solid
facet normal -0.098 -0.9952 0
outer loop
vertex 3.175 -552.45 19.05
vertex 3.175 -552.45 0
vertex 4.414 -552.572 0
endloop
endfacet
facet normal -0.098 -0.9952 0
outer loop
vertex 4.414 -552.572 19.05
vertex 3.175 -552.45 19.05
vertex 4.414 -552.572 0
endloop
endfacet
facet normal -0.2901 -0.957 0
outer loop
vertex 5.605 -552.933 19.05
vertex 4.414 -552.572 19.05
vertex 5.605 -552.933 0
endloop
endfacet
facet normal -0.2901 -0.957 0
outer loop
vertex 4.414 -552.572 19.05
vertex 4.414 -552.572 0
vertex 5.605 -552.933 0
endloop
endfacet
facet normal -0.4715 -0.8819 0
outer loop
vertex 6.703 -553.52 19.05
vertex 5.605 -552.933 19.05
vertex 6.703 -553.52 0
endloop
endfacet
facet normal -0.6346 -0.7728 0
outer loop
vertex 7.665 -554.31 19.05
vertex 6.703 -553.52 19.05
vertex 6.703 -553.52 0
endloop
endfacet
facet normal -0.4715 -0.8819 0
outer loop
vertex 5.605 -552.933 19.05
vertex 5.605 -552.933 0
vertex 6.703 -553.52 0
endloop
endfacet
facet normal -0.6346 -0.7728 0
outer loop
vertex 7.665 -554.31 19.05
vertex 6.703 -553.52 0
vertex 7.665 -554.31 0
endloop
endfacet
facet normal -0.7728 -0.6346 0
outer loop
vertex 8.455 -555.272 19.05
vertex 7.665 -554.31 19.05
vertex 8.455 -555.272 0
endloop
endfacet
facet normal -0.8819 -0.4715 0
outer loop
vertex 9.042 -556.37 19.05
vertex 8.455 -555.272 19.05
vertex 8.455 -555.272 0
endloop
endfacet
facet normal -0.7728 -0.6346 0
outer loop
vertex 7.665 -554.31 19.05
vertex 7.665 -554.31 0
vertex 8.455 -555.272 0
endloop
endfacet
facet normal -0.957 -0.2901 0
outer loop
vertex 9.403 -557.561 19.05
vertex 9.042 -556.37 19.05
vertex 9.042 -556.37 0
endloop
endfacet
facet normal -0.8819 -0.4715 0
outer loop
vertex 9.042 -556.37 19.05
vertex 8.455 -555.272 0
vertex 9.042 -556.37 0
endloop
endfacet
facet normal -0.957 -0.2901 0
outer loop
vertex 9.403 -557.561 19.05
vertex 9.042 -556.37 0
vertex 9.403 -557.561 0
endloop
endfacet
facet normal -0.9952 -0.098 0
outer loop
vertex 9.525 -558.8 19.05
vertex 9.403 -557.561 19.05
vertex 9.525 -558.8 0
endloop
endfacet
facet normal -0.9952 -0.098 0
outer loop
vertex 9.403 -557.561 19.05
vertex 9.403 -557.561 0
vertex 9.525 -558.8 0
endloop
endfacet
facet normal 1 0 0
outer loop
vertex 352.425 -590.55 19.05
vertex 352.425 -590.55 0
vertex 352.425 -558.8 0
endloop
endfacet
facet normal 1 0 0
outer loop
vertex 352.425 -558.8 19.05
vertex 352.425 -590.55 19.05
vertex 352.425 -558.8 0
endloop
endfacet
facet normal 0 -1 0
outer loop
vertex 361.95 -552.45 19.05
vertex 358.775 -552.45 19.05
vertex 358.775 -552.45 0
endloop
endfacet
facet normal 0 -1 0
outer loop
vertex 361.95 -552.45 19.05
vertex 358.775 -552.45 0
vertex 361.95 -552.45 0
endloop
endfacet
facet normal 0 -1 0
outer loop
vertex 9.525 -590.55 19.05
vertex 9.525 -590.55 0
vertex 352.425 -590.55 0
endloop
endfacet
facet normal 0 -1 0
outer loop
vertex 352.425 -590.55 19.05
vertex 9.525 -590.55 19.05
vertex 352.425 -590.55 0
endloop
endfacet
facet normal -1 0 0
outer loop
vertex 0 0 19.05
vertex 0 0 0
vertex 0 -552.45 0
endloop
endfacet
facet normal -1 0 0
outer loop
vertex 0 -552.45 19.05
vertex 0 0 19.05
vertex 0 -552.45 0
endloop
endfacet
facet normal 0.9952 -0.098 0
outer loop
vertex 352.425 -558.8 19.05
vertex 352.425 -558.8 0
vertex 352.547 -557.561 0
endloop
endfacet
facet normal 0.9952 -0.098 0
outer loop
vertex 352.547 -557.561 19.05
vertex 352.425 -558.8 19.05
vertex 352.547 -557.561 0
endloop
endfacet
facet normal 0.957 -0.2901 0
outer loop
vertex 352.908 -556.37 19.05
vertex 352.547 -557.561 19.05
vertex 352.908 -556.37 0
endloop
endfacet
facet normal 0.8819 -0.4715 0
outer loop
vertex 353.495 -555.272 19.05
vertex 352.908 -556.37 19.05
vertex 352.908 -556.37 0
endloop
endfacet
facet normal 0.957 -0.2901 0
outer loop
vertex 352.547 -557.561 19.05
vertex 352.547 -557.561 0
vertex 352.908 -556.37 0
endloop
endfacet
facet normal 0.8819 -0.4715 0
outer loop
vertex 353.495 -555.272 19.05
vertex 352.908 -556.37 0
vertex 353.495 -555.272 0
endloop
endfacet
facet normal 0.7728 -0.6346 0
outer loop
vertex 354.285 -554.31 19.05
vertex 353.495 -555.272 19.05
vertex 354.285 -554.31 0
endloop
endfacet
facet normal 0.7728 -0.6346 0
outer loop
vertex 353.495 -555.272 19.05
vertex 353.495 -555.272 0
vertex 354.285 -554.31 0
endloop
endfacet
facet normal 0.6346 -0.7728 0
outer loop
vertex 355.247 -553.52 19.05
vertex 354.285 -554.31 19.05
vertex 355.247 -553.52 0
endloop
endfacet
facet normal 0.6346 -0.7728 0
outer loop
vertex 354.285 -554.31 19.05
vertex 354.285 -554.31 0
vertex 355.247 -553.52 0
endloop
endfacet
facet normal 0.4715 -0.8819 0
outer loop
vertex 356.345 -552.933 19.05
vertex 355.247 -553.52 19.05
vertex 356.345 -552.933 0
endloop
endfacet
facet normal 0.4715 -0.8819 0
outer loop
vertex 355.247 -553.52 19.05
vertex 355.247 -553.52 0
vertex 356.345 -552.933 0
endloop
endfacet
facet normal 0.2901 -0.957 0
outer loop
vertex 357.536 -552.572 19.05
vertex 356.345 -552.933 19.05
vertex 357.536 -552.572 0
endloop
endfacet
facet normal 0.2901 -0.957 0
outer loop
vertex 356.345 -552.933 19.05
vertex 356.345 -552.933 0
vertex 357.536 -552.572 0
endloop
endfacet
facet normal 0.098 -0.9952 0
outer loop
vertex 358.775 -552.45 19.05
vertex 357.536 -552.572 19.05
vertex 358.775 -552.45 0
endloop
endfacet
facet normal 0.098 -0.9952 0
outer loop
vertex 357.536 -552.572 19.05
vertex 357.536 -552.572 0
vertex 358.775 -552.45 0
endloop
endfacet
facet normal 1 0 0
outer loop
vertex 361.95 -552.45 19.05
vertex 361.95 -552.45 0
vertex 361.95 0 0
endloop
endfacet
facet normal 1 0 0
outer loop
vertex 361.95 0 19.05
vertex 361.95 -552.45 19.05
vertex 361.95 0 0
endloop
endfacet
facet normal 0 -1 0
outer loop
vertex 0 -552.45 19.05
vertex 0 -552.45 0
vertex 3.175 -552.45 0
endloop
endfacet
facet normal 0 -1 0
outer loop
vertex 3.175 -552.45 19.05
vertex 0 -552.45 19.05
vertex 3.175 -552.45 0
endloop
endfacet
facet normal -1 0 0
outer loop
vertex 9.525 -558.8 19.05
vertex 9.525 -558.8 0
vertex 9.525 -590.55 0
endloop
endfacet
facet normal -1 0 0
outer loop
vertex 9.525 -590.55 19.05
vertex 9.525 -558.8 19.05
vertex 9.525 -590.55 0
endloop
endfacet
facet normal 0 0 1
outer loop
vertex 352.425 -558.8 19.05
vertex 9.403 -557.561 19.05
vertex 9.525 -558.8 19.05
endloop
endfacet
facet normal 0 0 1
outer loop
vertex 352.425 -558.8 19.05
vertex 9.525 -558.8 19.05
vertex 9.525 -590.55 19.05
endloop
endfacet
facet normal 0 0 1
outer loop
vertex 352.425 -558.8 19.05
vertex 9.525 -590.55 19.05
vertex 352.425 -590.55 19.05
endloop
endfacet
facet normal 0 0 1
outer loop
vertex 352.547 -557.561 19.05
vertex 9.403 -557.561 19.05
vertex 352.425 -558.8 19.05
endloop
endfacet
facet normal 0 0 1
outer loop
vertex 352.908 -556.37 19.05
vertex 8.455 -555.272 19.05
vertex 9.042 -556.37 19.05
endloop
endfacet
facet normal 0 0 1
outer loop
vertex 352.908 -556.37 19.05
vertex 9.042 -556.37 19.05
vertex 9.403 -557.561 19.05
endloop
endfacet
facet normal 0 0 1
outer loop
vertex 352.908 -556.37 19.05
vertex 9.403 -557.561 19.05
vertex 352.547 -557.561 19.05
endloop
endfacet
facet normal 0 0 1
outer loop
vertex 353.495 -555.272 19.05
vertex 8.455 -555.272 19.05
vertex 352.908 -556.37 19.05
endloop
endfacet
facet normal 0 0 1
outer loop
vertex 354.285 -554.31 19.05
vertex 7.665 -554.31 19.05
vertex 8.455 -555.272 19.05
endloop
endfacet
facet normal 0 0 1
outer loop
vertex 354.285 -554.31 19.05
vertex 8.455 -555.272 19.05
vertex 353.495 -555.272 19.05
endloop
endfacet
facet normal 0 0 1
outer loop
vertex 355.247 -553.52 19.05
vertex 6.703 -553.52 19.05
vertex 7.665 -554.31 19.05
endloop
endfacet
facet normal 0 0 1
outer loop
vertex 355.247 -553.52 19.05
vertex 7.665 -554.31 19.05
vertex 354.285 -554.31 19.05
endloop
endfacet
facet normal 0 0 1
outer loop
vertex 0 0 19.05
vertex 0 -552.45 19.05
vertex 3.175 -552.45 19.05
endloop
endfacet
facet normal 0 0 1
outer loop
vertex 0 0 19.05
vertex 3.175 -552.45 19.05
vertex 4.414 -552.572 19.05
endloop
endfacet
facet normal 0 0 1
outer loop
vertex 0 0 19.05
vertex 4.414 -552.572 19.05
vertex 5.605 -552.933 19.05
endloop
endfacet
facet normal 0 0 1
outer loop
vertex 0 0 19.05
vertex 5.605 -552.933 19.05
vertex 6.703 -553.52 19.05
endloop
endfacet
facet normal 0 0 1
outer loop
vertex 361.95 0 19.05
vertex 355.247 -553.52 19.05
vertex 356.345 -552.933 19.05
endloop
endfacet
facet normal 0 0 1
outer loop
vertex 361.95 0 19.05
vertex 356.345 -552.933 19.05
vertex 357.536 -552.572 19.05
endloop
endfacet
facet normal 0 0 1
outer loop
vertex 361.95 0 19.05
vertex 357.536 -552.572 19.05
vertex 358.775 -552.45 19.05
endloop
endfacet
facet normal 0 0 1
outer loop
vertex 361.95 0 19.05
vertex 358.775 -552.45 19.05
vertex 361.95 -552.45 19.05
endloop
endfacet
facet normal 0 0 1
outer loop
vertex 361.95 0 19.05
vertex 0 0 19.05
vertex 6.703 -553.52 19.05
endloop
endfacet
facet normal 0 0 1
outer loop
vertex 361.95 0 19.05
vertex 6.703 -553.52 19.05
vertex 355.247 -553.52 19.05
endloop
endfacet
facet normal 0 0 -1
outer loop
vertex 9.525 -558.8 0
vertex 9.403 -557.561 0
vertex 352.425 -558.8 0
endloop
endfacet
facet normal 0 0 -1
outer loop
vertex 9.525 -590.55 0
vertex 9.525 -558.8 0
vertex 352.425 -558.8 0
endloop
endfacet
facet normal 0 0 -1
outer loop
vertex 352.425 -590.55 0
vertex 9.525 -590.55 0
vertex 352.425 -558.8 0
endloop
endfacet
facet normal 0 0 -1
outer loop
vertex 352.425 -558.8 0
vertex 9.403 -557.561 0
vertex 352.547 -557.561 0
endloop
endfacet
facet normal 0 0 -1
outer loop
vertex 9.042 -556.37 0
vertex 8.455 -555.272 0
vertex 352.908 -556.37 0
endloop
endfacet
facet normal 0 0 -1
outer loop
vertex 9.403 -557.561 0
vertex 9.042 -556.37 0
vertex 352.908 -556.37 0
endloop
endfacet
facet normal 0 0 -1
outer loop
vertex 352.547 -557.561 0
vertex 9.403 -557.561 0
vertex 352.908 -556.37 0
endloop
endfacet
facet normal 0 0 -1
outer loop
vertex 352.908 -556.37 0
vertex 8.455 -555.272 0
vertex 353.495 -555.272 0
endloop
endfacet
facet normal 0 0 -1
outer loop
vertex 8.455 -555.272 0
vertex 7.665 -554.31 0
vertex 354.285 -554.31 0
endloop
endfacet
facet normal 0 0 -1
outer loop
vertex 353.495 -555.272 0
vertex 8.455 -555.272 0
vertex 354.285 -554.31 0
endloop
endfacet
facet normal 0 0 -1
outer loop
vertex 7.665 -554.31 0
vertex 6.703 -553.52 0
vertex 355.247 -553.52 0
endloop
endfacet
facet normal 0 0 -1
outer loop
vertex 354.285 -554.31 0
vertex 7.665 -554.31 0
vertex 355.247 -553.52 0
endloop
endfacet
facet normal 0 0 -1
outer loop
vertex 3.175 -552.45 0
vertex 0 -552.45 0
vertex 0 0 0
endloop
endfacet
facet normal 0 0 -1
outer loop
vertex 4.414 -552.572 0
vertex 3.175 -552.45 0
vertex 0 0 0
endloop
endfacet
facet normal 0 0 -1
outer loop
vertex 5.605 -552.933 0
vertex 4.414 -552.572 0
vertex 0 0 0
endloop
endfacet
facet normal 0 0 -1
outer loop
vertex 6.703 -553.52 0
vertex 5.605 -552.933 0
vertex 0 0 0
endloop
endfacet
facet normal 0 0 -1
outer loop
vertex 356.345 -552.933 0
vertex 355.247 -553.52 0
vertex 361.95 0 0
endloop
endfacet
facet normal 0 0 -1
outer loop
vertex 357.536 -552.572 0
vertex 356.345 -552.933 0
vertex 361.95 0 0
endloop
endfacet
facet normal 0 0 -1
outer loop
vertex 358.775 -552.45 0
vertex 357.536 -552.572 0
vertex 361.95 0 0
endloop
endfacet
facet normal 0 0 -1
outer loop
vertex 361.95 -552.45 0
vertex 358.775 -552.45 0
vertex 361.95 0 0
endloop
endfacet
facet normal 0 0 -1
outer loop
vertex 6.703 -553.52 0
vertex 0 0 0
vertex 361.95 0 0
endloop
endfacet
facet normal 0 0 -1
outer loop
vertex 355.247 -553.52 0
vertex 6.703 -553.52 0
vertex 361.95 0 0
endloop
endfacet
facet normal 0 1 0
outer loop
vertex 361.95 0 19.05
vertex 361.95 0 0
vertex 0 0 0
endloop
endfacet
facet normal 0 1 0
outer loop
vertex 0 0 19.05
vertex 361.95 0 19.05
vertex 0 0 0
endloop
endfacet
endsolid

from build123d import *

# Parameters (mm, degrees)
F1_DEPTH = 19.05


with BuildPart() as f1:
    # F0 (on Top) → F1 (new body)
    with BuildSketch(Plane.XY):
        with BuildLine():
            Line((361.95, 0), (0, 0))
            Line((0, 0), (0, -552.45))
            Line((0, -552.45), (3.175, -552.45))
            ThreePointArc((3.175, -552.45), (7.665128, -554.309872), (9.525, -558.8))
            Line((9.525, -558.8), (9.525, -590.55))
            Line((9.525, -590.55), (352.425, -590.55))
            Line((352.425, -590.55), (352.425, -558.8))
            ThreePointArc((352.425, -558.8), (354.284872, -554.309872), (358.775, -552.45))
            Line((358.775, -552.45), (361.95, -552.45))
            Line((361.95, -552.45), (361.95, 0))
        make_face()
    extrude(amount=F1_DEPTH)


solid = f1.part
